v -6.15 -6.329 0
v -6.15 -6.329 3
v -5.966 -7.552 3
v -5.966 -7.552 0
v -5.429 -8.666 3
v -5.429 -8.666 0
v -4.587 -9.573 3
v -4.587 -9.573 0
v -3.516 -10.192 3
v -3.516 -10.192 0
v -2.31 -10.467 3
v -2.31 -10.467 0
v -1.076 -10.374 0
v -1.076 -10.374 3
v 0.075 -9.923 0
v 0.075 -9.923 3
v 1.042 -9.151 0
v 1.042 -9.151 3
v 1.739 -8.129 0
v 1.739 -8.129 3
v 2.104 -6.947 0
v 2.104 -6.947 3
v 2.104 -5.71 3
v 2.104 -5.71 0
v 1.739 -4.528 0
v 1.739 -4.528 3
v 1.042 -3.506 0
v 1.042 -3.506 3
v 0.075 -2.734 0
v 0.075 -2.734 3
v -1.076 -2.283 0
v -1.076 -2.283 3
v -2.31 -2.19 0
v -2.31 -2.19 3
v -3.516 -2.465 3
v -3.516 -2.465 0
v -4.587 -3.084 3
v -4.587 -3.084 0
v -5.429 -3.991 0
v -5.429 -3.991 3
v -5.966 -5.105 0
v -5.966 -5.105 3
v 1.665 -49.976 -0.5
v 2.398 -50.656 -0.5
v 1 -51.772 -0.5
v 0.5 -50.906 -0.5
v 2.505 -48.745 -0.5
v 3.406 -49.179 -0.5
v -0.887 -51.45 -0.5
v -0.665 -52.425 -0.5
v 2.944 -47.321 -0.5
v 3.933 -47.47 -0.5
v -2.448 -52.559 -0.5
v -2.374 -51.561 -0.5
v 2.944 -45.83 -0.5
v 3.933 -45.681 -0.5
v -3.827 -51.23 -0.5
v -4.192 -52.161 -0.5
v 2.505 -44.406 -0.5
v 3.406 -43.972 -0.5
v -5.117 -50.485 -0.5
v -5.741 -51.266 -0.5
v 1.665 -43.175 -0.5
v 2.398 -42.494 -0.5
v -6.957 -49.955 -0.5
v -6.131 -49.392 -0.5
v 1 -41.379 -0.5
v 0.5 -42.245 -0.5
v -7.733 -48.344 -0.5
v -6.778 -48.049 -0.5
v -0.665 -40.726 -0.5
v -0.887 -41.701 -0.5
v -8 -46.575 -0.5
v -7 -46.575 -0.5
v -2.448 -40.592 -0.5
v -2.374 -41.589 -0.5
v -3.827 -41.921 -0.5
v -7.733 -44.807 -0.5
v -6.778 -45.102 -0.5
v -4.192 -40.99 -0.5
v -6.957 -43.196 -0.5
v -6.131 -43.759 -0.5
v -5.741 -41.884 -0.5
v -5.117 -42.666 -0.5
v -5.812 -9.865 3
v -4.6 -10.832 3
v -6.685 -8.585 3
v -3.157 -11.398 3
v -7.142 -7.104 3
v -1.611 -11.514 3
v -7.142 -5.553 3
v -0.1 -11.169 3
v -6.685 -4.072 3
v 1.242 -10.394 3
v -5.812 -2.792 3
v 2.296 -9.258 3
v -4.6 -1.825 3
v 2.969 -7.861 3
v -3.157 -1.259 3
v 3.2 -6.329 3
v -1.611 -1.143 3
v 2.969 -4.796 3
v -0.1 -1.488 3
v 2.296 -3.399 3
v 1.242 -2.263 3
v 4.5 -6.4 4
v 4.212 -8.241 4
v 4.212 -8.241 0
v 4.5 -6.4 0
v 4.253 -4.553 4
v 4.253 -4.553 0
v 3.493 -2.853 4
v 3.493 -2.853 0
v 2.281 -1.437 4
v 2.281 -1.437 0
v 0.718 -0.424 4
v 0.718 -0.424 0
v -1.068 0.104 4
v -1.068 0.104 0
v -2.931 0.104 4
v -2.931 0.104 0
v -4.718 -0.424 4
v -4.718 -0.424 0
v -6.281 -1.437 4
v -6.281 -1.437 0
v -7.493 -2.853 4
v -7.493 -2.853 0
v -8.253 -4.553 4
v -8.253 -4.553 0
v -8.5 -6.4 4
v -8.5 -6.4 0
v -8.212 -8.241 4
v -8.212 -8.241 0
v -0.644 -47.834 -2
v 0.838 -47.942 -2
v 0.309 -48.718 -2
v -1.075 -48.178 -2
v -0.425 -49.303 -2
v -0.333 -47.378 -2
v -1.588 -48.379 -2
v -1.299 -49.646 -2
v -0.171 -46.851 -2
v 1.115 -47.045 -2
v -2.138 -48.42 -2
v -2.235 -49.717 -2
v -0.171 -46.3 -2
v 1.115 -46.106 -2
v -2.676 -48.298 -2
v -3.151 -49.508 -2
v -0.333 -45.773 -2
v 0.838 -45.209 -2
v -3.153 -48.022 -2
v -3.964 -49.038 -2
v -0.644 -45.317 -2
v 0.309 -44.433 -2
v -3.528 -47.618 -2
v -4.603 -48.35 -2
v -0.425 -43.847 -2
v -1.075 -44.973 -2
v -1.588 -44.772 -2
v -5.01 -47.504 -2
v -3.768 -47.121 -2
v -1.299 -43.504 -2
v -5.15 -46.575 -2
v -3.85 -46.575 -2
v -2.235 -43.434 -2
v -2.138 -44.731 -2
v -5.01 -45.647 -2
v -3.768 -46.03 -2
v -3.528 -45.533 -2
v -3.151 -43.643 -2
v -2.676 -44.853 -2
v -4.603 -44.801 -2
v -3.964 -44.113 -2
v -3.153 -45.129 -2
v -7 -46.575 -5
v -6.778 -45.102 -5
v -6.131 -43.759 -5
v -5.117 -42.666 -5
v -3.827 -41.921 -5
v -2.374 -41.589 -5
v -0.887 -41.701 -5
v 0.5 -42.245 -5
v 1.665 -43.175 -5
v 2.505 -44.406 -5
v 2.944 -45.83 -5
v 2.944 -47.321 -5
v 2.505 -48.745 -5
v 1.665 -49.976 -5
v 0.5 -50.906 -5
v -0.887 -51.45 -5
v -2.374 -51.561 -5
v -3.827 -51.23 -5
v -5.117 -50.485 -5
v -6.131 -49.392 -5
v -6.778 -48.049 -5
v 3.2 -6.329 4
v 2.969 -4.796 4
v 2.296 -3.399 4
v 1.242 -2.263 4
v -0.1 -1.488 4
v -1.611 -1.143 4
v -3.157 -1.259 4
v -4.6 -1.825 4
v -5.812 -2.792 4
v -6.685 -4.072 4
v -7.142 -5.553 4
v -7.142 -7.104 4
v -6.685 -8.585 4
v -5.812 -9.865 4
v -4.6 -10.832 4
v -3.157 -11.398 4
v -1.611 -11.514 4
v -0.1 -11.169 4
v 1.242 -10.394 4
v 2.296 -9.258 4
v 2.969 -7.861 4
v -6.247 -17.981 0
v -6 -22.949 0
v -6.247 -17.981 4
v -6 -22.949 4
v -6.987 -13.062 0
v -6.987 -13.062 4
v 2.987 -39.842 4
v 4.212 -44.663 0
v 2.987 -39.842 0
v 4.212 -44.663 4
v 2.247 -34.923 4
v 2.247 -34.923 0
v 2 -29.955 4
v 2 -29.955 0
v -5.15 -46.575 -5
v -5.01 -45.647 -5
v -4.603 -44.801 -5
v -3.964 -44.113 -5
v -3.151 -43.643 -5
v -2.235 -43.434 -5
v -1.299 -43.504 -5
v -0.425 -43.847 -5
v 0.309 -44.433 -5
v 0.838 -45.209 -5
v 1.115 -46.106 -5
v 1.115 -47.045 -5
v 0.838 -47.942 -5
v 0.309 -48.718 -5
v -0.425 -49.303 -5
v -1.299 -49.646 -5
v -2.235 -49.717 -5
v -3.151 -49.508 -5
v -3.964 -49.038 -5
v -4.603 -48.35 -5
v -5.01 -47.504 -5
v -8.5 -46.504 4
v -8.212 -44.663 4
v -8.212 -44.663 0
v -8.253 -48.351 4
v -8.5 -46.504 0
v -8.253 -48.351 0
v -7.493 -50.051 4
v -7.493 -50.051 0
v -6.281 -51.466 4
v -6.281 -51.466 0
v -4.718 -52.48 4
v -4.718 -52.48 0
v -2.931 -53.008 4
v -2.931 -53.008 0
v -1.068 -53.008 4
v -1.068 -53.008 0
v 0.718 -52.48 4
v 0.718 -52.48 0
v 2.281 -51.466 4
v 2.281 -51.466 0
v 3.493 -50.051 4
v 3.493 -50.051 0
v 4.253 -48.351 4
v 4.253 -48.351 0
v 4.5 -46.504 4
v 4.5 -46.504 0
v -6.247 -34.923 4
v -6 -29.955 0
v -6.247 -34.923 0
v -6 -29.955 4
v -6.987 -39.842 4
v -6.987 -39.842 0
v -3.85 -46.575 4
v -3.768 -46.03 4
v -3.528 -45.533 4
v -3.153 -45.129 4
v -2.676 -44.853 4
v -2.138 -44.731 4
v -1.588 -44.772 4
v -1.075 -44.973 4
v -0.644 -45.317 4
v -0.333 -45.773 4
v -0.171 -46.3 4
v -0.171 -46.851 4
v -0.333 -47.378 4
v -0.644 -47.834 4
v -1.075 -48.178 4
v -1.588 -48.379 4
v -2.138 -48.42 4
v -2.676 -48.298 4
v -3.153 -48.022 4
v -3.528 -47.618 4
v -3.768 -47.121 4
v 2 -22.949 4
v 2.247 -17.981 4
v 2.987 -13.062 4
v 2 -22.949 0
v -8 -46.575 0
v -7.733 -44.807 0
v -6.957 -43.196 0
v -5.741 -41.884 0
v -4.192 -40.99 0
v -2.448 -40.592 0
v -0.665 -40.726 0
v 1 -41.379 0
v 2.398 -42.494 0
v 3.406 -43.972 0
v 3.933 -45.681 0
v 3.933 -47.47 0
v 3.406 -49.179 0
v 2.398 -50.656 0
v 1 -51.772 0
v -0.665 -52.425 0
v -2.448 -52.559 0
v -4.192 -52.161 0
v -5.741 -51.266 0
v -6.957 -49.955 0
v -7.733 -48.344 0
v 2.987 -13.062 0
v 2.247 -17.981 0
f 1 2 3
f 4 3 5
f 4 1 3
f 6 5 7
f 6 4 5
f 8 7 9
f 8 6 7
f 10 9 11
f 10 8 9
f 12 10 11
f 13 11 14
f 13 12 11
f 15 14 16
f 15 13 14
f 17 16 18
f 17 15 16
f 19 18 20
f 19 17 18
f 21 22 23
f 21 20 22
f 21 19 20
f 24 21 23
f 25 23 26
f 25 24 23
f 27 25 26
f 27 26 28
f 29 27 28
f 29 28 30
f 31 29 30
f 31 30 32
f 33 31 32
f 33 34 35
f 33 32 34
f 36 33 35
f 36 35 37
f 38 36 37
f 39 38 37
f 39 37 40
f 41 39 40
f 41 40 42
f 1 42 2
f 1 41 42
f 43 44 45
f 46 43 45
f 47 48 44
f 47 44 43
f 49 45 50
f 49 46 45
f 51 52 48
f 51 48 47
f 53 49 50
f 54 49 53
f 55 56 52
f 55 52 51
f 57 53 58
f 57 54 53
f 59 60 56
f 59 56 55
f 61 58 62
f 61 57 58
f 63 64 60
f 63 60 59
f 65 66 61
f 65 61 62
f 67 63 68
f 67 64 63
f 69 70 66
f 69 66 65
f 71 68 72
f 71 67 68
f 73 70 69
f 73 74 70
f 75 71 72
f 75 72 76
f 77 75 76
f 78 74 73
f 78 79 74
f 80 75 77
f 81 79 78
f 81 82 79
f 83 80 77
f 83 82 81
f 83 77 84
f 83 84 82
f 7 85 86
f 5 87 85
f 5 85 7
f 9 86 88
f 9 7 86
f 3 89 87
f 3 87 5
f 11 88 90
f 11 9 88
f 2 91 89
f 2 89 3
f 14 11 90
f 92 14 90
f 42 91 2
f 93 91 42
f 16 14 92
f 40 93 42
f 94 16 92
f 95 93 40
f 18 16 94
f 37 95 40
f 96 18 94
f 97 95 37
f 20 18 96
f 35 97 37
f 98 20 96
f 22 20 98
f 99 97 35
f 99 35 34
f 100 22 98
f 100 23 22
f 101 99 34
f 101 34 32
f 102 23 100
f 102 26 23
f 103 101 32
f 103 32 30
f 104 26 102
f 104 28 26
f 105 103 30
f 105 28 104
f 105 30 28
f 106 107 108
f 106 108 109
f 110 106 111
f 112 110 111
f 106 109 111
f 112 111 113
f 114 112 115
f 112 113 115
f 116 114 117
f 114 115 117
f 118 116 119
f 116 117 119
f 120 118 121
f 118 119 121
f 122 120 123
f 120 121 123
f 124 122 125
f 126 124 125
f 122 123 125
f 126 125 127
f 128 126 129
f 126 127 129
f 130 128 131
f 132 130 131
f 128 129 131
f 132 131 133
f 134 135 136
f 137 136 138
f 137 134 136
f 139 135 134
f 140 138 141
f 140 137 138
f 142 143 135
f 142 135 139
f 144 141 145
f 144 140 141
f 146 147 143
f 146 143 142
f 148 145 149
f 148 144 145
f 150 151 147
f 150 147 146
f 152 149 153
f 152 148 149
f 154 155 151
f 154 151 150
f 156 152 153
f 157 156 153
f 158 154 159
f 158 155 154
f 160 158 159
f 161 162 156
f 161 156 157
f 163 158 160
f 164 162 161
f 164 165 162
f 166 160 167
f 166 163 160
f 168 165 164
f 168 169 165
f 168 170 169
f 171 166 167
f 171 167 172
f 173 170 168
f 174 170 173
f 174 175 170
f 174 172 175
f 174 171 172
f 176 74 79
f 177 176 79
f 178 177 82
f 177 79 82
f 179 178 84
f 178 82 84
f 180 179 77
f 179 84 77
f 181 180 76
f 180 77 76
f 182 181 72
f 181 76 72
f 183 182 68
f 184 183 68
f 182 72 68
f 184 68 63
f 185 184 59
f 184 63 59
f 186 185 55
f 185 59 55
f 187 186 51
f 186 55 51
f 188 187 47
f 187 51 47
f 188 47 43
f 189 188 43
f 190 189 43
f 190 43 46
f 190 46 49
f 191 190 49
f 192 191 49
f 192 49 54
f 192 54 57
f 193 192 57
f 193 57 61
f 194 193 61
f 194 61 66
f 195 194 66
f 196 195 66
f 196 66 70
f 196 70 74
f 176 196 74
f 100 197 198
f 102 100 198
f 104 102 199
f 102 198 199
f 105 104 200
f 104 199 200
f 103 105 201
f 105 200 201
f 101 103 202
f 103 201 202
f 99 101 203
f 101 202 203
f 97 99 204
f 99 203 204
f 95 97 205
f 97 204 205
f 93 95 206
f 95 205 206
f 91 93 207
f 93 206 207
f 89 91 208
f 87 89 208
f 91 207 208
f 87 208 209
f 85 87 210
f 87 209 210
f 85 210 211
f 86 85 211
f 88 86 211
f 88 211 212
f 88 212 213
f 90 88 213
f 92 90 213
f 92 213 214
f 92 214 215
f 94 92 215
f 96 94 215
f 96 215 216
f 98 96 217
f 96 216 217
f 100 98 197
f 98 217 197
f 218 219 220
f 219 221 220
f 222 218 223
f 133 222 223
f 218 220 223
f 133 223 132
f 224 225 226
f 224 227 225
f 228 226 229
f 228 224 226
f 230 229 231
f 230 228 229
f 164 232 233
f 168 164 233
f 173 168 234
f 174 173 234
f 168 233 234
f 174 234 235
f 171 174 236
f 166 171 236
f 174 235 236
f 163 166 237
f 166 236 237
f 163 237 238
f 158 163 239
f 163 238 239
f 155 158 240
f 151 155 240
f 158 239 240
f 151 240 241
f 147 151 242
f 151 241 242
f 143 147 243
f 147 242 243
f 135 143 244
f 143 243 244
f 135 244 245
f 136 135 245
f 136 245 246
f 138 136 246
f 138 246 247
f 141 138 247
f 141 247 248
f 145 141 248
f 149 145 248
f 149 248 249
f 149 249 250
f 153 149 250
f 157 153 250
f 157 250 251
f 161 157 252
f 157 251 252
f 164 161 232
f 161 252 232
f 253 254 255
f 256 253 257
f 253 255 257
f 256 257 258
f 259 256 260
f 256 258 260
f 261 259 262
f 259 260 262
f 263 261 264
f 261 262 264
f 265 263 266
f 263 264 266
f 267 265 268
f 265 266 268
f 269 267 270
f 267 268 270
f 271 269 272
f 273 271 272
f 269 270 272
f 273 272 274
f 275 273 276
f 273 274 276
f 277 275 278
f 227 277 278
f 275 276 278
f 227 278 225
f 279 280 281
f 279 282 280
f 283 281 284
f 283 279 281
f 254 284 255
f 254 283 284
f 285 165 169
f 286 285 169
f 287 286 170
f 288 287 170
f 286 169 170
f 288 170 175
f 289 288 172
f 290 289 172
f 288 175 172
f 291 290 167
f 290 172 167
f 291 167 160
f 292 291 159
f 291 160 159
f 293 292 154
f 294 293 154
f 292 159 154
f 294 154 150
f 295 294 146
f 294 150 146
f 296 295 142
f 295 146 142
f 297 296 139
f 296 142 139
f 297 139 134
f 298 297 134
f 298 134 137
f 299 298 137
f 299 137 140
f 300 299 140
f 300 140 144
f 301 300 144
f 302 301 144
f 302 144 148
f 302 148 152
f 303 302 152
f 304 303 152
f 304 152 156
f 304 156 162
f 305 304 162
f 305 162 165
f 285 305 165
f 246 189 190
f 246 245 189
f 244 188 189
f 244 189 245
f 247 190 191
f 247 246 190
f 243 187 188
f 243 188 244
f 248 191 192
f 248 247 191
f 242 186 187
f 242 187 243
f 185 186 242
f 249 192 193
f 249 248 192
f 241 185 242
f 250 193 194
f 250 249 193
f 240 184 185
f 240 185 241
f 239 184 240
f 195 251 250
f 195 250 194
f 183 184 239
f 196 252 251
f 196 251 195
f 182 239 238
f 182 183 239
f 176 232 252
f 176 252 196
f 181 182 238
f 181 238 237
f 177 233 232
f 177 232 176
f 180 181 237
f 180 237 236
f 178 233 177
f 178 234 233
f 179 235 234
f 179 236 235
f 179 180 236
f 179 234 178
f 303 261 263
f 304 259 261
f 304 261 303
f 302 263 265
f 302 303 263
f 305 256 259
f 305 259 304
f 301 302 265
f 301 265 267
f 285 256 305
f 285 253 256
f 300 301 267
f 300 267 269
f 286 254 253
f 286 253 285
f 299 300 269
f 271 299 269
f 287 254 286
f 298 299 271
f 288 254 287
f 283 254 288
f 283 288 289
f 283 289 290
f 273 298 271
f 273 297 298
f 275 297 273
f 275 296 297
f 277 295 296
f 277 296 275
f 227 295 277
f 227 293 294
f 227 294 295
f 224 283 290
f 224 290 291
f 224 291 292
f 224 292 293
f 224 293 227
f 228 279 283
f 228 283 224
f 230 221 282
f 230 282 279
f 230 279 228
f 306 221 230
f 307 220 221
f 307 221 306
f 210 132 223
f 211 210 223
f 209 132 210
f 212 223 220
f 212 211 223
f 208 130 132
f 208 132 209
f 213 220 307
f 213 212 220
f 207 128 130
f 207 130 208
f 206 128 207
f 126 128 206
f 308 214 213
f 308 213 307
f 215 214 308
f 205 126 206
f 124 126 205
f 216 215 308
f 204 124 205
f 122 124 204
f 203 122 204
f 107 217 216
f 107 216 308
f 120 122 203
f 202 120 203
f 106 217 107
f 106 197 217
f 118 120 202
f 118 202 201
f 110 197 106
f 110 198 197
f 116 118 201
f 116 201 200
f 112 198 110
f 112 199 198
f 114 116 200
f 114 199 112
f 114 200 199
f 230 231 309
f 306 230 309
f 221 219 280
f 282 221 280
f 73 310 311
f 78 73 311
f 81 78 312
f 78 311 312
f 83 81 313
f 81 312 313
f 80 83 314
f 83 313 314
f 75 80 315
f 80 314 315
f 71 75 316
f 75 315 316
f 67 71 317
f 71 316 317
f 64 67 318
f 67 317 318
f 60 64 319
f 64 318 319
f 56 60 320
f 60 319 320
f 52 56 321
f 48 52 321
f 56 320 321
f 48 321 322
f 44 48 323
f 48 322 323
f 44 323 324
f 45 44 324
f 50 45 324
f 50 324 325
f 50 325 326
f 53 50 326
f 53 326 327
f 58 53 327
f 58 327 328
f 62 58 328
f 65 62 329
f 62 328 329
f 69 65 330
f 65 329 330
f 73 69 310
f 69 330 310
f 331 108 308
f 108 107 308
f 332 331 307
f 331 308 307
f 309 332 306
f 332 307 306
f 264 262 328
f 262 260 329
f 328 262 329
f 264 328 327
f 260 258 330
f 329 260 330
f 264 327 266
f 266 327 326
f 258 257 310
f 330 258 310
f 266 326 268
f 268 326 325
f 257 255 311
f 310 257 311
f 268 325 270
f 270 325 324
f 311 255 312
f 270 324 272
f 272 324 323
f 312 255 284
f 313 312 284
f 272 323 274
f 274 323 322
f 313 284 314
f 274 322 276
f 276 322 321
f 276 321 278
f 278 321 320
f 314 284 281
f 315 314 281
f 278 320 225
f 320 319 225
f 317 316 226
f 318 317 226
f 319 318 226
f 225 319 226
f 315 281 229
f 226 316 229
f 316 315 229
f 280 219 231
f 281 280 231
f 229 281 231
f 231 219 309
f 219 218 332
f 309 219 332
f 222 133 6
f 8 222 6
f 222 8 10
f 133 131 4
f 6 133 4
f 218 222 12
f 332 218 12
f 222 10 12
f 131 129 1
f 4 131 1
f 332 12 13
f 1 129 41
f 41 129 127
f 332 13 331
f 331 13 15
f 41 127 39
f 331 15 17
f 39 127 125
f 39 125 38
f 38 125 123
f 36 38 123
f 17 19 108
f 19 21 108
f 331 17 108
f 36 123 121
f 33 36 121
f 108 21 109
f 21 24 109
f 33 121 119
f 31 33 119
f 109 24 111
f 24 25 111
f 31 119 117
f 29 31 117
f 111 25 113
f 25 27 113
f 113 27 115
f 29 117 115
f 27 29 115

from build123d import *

# Parameters (mm, degrees)
SKETCH_1_R          = 4.15
EXTRUDE_1_DEPTH     = 4
FILLET_1_R          = 50
SKETCH_4_R          = 5
EXTRUDE_2_DEPTH     = 5
SKETCH_5_R          = 6
EXTRUDE_3_DEPTH     = 0.5
SKETCH_6_R          = 3.15
CUT_EXTRUDE_2_DEPTH = 3
SKETCH_7_R          = 1.85
CUT_EXTRUDE_3_DEPTH = 10
SKETCH_8_R          = 5.2
CUT_EXTRUDE_4_DEPTH = 1


with BuildPart() as part:
    # 草图1 → 凸台-拉伸1 (new body)
    with BuildSketch(Plane.XY):
        with BuildLine():
            Line((-5.999958142, -11.451976213), (-5.999958142, -41.451976213))
            ThreePointArc((-5.999958142, -41.451976213), (-1.999958142, -53.075451596), (2.000041858, -41.451976213))
            Line((2.000041858, -41.451976213), (2.000041858, -11.451976213))
            ThreePointArc((2.000041858, -11.451976213), (-1.999958142, 0.17149917), (-5.999958142, -11.451976213))
        make_face()
        with Locations(Location((-1.999958142, -6.32850083, 0), (0, 0, 180))):
            Circle(SKETCH_1_R, mode=Mode.SUBTRACT)
    extrude(amount=EXTRUDE_1_DEPTH)

    # 圆角1
    fillet_1_edges = [part.edges().sort_by_distance(p)[0] for p in [
        (-5.999958142, -41.451976213, 2),
        (-5.999958142, -11.451976213, 2),
        (2.000041858, -11.451976213, 2),
        (2.000041858, -41.451976213, 2),
    ]]
    fillet(fillet_1_edges, radius=FILLET_1_R)

    # 草图4 → 凸台-拉伸2 (add)
    with BuildSketch(Plane(origin=(0, 0, 0), x_dir=(-1, 0, 0), z_dir=(0, 0, -1))):
        with Locations((1.999958142, -46.575451596)):
            Circle(SKETCH_4_R)
    extrude(amount=EXTRUDE_2_DEPTH)

    # 草图5 → 凸台-拉伸3 (add)
    with BuildSketch(Plane(origin=(0, 0, 0), x_dir=(-1, 0, 0), z_dir=(0, 0, -1))):
        with Locations((1.999958142, -46.575451596)):
            Circle(SKETCH_5_R)
    extrude(amount=EXTRUDE_3_DEPTH)

    # 草图6 → 切除-拉伸2 (cut)
    with BuildSketch(Plane(origin=(0, 0, -5), x_dir=(-1, 0, 0), z_dir=(0, 0, -1))):
        with Locations((1.999958142, -46.575451596)):
            Circle(SKETCH_6_R)
    extrude(amount=-CUT_EXTRUDE_2_DEPTH, mode=Mode.SUBTRACT)

    # 草图7 → 切除-拉伸3 (cut)
    with BuildSketch(Plane(origin=(0, 0, -2), x_dir=(-1, 0, 0), z_dir=(0, 0, -1))):
        with Locations((1.999958142, -46.575451596)):
            Circle(SKETCH_7_R)
    extrude(amount=-CUT_EXTRUDE_3_DEPTH, mode=Mode.SUBTRACT)

    # 草图8 → 切除-拉伸4 (cut)
    with BuildSketch(Plane.XY.offset(4)):
        with Locations((-1.999958142, -6.32850083)):
            Circle(SKETCH_8_R)
    extrude(amount=-CUT_EXTRUDE_4_DEPTH, mode=Mode.SUBTRACT)


solid = part.part
